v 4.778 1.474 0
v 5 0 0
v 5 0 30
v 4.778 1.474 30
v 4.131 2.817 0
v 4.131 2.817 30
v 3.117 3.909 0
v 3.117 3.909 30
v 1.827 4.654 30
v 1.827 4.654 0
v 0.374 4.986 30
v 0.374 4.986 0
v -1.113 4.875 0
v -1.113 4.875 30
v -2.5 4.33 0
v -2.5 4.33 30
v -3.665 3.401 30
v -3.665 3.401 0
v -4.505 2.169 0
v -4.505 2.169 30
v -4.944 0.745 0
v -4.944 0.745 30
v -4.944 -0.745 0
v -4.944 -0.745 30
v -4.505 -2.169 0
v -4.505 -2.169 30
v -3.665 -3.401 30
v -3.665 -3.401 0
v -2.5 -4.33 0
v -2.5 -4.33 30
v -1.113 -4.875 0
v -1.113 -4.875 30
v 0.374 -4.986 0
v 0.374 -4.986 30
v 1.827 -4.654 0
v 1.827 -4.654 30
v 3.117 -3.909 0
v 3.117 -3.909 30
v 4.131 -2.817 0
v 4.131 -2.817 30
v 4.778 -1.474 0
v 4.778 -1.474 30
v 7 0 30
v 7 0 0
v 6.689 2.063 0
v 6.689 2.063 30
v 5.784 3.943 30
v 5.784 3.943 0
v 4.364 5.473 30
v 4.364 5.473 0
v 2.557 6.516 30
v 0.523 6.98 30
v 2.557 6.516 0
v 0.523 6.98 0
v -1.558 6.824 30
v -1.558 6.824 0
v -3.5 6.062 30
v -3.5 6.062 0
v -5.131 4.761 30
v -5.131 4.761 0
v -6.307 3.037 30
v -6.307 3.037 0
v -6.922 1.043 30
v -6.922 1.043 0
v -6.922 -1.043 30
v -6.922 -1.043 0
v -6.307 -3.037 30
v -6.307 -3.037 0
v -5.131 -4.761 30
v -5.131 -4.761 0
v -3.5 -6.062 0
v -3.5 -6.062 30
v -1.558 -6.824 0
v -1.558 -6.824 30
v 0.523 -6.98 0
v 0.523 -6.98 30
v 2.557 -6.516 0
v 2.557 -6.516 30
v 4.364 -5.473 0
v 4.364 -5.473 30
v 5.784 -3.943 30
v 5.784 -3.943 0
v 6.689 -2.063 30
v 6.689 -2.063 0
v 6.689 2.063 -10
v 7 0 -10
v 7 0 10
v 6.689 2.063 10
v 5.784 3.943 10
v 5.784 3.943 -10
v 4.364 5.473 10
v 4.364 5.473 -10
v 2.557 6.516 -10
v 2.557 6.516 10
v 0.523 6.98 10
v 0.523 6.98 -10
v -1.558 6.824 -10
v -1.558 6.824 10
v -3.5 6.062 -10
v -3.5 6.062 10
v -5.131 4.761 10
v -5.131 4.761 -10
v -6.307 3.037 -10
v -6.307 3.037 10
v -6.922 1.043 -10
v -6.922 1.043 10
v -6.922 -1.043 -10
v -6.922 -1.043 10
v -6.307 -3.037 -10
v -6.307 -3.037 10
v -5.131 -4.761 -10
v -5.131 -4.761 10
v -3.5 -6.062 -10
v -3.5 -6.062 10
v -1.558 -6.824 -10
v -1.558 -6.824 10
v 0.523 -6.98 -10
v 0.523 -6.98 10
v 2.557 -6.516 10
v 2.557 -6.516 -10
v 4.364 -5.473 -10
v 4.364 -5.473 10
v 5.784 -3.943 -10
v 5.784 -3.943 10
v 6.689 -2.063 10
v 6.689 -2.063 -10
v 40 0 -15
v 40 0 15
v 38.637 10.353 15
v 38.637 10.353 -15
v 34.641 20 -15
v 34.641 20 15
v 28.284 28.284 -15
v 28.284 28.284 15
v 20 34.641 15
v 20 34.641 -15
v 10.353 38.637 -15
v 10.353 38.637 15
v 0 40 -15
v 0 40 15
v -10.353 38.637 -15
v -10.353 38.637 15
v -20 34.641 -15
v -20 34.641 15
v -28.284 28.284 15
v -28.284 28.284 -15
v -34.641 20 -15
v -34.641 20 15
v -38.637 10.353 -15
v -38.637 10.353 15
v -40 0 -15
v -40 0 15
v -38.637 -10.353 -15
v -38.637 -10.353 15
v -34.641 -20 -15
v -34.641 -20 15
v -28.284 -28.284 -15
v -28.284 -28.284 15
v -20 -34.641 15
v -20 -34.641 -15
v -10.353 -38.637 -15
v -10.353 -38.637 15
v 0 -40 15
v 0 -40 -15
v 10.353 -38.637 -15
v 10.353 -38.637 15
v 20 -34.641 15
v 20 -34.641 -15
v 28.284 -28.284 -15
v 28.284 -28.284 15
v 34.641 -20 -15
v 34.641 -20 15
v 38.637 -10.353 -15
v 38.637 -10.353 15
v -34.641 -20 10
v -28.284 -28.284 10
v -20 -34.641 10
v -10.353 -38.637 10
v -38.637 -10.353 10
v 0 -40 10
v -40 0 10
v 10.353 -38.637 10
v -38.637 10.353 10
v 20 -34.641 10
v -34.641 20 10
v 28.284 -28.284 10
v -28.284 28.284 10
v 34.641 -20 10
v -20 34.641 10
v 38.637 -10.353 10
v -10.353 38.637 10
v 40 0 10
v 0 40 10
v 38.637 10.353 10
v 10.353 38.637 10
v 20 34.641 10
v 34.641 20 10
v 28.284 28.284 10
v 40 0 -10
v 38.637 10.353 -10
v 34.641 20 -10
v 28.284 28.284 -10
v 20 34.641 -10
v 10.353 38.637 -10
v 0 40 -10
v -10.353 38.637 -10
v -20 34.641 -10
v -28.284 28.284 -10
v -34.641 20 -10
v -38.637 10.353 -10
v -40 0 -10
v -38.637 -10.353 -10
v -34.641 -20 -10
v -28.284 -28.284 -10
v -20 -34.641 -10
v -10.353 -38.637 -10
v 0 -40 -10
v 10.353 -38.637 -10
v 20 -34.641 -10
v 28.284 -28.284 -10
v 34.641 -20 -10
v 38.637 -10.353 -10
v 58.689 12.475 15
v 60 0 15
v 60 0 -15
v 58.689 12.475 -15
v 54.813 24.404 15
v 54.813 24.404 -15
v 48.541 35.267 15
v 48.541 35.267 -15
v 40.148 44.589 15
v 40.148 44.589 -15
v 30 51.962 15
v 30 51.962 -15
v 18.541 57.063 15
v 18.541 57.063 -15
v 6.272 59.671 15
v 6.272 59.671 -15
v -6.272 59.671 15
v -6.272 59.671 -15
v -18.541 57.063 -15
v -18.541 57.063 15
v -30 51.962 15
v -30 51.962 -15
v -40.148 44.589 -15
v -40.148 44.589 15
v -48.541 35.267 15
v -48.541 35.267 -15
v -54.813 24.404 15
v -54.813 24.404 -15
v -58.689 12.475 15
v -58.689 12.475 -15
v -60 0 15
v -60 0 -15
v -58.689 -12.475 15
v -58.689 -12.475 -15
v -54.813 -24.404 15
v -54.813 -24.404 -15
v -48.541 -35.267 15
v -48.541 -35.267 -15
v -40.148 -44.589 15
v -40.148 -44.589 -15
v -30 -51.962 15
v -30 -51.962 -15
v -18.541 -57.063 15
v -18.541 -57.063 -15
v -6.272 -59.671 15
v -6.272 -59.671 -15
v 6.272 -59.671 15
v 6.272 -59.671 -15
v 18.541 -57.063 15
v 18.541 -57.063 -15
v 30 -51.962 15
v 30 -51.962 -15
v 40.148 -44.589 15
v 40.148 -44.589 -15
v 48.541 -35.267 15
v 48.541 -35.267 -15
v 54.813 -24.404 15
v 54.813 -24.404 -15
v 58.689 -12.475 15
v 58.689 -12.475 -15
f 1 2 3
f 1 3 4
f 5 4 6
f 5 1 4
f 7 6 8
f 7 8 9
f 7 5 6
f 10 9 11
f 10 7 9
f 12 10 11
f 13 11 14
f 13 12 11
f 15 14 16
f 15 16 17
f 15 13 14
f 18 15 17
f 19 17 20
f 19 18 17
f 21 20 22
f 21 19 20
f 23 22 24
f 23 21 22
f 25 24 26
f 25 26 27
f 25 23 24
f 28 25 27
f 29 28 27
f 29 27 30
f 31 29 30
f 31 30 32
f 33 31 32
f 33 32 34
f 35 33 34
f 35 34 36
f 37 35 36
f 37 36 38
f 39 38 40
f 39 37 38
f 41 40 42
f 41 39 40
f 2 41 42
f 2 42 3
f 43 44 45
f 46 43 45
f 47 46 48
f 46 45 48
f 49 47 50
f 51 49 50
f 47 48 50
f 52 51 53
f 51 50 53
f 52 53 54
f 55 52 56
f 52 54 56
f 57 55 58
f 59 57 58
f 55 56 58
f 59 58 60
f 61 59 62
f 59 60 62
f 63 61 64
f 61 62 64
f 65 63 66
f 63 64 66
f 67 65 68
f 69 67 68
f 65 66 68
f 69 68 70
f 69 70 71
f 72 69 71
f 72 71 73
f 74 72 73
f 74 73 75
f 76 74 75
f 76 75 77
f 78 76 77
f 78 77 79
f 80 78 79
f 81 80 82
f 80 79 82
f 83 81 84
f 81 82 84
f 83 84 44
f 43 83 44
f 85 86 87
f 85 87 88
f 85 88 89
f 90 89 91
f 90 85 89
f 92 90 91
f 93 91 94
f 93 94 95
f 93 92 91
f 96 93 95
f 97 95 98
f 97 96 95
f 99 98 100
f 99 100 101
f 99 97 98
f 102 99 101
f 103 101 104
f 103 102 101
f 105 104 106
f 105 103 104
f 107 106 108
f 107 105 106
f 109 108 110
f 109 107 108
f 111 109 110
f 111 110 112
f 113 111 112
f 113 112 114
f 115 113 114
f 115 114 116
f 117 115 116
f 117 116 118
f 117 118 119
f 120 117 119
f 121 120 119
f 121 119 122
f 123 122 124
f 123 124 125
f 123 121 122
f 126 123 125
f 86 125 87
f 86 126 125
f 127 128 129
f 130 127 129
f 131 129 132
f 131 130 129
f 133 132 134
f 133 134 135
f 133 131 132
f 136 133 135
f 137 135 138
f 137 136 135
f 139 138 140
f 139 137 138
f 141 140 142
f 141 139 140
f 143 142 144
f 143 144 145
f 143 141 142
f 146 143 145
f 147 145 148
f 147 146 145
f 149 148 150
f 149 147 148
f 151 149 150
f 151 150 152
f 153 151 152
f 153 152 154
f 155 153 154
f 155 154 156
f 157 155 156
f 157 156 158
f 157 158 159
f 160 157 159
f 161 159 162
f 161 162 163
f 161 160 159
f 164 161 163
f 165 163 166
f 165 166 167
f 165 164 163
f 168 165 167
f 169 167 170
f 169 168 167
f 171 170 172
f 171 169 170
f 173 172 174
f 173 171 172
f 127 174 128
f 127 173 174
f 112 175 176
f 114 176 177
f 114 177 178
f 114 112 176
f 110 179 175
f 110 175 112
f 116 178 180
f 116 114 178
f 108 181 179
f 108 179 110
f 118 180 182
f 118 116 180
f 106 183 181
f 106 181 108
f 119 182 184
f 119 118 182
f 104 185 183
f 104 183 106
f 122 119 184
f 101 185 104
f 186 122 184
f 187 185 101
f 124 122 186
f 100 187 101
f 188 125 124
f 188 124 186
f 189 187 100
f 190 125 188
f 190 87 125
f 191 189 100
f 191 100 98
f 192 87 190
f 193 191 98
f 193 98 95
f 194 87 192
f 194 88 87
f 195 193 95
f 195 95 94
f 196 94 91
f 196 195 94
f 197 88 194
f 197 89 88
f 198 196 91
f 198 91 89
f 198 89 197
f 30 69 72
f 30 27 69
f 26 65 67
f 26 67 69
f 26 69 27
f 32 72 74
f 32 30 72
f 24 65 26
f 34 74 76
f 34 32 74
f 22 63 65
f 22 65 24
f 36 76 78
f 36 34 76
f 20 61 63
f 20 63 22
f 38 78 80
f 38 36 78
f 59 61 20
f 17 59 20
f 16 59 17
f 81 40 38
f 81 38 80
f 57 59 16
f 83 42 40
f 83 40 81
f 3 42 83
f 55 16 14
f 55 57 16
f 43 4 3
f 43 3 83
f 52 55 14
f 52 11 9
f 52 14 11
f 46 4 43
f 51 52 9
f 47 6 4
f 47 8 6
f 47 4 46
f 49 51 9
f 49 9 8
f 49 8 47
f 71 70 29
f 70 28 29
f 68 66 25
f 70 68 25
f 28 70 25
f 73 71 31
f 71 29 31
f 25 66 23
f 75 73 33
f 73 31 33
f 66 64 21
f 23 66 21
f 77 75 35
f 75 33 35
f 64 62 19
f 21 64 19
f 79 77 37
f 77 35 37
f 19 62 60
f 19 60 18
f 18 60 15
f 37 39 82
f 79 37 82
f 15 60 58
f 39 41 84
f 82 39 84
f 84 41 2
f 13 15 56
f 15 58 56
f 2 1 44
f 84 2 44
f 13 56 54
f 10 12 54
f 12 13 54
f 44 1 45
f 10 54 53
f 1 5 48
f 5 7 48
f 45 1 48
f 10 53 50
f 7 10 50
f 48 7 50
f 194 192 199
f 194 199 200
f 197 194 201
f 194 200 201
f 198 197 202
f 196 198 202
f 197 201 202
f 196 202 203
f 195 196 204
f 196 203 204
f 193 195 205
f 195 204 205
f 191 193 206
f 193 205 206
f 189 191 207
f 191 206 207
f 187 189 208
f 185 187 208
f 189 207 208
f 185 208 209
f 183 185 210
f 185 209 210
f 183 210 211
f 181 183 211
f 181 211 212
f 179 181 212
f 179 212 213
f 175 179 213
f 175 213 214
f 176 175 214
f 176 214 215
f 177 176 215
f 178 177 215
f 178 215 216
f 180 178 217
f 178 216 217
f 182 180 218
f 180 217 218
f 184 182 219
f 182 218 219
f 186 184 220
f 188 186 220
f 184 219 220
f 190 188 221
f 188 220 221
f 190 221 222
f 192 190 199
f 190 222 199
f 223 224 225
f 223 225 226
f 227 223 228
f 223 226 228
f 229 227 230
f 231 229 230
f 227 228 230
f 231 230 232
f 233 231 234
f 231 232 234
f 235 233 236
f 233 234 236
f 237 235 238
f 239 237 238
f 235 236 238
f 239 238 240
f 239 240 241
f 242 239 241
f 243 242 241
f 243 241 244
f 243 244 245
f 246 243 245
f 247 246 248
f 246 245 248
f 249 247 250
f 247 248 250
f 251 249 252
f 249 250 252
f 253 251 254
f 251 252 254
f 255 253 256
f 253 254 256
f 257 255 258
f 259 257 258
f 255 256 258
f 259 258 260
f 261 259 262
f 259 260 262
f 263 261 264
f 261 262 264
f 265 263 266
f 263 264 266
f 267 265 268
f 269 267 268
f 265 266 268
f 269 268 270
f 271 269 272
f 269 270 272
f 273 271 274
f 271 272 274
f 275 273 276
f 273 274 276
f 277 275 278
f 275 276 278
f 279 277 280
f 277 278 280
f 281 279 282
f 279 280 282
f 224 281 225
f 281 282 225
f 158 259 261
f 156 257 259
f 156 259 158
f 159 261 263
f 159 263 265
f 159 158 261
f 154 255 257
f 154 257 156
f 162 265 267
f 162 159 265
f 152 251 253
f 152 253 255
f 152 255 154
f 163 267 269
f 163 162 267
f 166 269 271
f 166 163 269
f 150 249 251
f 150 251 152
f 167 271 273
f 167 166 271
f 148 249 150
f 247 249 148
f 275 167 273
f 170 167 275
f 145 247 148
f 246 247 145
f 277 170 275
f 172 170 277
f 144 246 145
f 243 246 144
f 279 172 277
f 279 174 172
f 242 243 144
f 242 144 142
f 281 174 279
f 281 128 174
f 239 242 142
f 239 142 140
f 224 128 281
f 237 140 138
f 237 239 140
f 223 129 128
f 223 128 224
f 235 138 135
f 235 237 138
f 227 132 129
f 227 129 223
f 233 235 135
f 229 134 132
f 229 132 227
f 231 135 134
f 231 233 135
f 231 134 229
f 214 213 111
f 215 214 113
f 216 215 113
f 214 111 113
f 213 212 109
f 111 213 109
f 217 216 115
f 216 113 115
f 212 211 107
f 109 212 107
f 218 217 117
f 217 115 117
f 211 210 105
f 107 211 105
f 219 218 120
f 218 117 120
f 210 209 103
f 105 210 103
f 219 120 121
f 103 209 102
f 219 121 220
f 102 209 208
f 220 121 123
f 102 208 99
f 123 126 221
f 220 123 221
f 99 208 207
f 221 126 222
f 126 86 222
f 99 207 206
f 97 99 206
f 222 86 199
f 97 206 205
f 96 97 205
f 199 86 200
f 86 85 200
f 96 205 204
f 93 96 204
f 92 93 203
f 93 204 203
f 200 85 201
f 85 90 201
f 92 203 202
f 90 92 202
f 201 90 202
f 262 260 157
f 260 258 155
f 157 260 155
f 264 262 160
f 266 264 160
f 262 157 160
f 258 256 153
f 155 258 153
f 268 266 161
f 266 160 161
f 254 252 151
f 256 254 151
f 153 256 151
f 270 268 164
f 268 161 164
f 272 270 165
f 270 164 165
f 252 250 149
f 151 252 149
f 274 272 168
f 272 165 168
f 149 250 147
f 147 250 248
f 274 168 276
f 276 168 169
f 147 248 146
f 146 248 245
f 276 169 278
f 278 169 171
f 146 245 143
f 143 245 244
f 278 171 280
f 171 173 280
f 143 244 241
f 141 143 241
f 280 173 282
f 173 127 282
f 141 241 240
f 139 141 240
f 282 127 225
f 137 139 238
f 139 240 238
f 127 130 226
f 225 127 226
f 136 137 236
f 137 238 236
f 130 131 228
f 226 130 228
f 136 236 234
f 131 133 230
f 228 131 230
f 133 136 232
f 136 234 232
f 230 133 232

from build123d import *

# Parameters (mm, degrees)
BOSS_EXTRUDE1_DEPTH      = 15
BOSS_EXTRUDE1_DEPTH_BACK = 15
SKETCH1_R                = 60
SKETCH1_R_2              = 40
BOSS_EXTRUDE2_DEPTH      = 10
BOSS_EXTRUDE2_DEPTH_BACK = 10
SKETCH1_3_R              = 40
SKETCH1_3_R_2            = 7
SKETCH1_4_R              = 7
SKETCH1_4_R_2            = 5
BOSS_EXTRUDE3_DEPTH      = 30


with BuildPart() as part:
    # Sketch1 → Boss-Extrude1 (new, two sides: drawn at the far end of the back side and taken through both)
    with BuildSketch(Plane.XY.offset(-BOSS_EXTRUDE1_DEPTH_BACK)):
        Circle(SKETCH1_R)
        Circle(SKETCH1_R_2, mode=Mode.SUBTRACT)
    extrude(amount=BOSS_EXTRUDE1_DEPTH + BOSS_EXTRUDE1_DEPTH_BACK)


with BuildPart() as body_2:
    # Sketch1<3> → Boss-Extrude2 (new, two sides: drawn at the far end of the back side and taken through both)
    with BuildSketch(Plane.XY.offset(-BOSS_EXTRUDE2_DEPTH_BACK)):
        Circle(SKETCH1_3_R)
        Circle(SKETCH1_3_R_2, mode=Mode.SUBTRACT)
    extrude(amount=BOSS_EXTRUDE2_DEPTH + BOSS_EXTRUDE2_DEPTH_BACK)


with BuildPart() as body_3:
    # Sketch1<4> → Boss-Extrude3 (new body)
    with BuildSketch(Plane.XY):
        Circle(SKETCH1_4_R)
        Circle(SKETCH1_4_R_2, mode=Mode.SUBTRACT)
    extrude(amount=BOSS_EXTRUDE3_DEPTH)


solid = Compound([part.part, body_2.part, body_3.part])
